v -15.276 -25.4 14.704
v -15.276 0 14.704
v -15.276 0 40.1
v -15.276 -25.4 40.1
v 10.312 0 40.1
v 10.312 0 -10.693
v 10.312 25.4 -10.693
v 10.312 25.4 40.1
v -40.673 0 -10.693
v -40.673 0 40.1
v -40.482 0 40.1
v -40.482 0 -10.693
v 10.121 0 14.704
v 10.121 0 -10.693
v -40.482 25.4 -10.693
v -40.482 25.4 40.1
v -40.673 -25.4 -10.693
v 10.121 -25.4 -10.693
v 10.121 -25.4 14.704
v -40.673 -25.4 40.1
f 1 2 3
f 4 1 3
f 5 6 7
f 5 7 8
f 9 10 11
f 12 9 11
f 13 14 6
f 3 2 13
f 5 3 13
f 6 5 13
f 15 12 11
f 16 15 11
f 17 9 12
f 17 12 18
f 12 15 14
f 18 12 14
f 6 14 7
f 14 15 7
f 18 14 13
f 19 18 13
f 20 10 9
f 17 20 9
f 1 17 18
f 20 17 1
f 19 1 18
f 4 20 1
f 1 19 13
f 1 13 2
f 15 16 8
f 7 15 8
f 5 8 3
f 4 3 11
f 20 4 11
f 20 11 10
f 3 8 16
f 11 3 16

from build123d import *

# Parameters (mm, degrees)
F1_W     = 50.793938
F1_H     = 50.793942
F2_DEPTH = 25.4
F3_DEPTH = 25.4


with BuildPart() as f2:
    # F1 (on Front) → F2 (new body)
    with BuildSketch(Plane.XZ):
        with Locations((-15.085418, 14.70351)):
            Rectangle(F1_W, F1_H)
    extrude(amount=-F2_DEPTH)

    # F0 (on Front) → F3 (join)
    with BuildSketch(Plane.XZ):
        Polygon((-15.276372, 40.100481), (-40.673342, 40.100481), (-40.673342, -10.693461), (10.120596, -10.693461), (10.120596, 14.703508), (-15.276372, 14.703508), align=None)
    extrude(amount=F3_DEPTH)


solid = f2.part
